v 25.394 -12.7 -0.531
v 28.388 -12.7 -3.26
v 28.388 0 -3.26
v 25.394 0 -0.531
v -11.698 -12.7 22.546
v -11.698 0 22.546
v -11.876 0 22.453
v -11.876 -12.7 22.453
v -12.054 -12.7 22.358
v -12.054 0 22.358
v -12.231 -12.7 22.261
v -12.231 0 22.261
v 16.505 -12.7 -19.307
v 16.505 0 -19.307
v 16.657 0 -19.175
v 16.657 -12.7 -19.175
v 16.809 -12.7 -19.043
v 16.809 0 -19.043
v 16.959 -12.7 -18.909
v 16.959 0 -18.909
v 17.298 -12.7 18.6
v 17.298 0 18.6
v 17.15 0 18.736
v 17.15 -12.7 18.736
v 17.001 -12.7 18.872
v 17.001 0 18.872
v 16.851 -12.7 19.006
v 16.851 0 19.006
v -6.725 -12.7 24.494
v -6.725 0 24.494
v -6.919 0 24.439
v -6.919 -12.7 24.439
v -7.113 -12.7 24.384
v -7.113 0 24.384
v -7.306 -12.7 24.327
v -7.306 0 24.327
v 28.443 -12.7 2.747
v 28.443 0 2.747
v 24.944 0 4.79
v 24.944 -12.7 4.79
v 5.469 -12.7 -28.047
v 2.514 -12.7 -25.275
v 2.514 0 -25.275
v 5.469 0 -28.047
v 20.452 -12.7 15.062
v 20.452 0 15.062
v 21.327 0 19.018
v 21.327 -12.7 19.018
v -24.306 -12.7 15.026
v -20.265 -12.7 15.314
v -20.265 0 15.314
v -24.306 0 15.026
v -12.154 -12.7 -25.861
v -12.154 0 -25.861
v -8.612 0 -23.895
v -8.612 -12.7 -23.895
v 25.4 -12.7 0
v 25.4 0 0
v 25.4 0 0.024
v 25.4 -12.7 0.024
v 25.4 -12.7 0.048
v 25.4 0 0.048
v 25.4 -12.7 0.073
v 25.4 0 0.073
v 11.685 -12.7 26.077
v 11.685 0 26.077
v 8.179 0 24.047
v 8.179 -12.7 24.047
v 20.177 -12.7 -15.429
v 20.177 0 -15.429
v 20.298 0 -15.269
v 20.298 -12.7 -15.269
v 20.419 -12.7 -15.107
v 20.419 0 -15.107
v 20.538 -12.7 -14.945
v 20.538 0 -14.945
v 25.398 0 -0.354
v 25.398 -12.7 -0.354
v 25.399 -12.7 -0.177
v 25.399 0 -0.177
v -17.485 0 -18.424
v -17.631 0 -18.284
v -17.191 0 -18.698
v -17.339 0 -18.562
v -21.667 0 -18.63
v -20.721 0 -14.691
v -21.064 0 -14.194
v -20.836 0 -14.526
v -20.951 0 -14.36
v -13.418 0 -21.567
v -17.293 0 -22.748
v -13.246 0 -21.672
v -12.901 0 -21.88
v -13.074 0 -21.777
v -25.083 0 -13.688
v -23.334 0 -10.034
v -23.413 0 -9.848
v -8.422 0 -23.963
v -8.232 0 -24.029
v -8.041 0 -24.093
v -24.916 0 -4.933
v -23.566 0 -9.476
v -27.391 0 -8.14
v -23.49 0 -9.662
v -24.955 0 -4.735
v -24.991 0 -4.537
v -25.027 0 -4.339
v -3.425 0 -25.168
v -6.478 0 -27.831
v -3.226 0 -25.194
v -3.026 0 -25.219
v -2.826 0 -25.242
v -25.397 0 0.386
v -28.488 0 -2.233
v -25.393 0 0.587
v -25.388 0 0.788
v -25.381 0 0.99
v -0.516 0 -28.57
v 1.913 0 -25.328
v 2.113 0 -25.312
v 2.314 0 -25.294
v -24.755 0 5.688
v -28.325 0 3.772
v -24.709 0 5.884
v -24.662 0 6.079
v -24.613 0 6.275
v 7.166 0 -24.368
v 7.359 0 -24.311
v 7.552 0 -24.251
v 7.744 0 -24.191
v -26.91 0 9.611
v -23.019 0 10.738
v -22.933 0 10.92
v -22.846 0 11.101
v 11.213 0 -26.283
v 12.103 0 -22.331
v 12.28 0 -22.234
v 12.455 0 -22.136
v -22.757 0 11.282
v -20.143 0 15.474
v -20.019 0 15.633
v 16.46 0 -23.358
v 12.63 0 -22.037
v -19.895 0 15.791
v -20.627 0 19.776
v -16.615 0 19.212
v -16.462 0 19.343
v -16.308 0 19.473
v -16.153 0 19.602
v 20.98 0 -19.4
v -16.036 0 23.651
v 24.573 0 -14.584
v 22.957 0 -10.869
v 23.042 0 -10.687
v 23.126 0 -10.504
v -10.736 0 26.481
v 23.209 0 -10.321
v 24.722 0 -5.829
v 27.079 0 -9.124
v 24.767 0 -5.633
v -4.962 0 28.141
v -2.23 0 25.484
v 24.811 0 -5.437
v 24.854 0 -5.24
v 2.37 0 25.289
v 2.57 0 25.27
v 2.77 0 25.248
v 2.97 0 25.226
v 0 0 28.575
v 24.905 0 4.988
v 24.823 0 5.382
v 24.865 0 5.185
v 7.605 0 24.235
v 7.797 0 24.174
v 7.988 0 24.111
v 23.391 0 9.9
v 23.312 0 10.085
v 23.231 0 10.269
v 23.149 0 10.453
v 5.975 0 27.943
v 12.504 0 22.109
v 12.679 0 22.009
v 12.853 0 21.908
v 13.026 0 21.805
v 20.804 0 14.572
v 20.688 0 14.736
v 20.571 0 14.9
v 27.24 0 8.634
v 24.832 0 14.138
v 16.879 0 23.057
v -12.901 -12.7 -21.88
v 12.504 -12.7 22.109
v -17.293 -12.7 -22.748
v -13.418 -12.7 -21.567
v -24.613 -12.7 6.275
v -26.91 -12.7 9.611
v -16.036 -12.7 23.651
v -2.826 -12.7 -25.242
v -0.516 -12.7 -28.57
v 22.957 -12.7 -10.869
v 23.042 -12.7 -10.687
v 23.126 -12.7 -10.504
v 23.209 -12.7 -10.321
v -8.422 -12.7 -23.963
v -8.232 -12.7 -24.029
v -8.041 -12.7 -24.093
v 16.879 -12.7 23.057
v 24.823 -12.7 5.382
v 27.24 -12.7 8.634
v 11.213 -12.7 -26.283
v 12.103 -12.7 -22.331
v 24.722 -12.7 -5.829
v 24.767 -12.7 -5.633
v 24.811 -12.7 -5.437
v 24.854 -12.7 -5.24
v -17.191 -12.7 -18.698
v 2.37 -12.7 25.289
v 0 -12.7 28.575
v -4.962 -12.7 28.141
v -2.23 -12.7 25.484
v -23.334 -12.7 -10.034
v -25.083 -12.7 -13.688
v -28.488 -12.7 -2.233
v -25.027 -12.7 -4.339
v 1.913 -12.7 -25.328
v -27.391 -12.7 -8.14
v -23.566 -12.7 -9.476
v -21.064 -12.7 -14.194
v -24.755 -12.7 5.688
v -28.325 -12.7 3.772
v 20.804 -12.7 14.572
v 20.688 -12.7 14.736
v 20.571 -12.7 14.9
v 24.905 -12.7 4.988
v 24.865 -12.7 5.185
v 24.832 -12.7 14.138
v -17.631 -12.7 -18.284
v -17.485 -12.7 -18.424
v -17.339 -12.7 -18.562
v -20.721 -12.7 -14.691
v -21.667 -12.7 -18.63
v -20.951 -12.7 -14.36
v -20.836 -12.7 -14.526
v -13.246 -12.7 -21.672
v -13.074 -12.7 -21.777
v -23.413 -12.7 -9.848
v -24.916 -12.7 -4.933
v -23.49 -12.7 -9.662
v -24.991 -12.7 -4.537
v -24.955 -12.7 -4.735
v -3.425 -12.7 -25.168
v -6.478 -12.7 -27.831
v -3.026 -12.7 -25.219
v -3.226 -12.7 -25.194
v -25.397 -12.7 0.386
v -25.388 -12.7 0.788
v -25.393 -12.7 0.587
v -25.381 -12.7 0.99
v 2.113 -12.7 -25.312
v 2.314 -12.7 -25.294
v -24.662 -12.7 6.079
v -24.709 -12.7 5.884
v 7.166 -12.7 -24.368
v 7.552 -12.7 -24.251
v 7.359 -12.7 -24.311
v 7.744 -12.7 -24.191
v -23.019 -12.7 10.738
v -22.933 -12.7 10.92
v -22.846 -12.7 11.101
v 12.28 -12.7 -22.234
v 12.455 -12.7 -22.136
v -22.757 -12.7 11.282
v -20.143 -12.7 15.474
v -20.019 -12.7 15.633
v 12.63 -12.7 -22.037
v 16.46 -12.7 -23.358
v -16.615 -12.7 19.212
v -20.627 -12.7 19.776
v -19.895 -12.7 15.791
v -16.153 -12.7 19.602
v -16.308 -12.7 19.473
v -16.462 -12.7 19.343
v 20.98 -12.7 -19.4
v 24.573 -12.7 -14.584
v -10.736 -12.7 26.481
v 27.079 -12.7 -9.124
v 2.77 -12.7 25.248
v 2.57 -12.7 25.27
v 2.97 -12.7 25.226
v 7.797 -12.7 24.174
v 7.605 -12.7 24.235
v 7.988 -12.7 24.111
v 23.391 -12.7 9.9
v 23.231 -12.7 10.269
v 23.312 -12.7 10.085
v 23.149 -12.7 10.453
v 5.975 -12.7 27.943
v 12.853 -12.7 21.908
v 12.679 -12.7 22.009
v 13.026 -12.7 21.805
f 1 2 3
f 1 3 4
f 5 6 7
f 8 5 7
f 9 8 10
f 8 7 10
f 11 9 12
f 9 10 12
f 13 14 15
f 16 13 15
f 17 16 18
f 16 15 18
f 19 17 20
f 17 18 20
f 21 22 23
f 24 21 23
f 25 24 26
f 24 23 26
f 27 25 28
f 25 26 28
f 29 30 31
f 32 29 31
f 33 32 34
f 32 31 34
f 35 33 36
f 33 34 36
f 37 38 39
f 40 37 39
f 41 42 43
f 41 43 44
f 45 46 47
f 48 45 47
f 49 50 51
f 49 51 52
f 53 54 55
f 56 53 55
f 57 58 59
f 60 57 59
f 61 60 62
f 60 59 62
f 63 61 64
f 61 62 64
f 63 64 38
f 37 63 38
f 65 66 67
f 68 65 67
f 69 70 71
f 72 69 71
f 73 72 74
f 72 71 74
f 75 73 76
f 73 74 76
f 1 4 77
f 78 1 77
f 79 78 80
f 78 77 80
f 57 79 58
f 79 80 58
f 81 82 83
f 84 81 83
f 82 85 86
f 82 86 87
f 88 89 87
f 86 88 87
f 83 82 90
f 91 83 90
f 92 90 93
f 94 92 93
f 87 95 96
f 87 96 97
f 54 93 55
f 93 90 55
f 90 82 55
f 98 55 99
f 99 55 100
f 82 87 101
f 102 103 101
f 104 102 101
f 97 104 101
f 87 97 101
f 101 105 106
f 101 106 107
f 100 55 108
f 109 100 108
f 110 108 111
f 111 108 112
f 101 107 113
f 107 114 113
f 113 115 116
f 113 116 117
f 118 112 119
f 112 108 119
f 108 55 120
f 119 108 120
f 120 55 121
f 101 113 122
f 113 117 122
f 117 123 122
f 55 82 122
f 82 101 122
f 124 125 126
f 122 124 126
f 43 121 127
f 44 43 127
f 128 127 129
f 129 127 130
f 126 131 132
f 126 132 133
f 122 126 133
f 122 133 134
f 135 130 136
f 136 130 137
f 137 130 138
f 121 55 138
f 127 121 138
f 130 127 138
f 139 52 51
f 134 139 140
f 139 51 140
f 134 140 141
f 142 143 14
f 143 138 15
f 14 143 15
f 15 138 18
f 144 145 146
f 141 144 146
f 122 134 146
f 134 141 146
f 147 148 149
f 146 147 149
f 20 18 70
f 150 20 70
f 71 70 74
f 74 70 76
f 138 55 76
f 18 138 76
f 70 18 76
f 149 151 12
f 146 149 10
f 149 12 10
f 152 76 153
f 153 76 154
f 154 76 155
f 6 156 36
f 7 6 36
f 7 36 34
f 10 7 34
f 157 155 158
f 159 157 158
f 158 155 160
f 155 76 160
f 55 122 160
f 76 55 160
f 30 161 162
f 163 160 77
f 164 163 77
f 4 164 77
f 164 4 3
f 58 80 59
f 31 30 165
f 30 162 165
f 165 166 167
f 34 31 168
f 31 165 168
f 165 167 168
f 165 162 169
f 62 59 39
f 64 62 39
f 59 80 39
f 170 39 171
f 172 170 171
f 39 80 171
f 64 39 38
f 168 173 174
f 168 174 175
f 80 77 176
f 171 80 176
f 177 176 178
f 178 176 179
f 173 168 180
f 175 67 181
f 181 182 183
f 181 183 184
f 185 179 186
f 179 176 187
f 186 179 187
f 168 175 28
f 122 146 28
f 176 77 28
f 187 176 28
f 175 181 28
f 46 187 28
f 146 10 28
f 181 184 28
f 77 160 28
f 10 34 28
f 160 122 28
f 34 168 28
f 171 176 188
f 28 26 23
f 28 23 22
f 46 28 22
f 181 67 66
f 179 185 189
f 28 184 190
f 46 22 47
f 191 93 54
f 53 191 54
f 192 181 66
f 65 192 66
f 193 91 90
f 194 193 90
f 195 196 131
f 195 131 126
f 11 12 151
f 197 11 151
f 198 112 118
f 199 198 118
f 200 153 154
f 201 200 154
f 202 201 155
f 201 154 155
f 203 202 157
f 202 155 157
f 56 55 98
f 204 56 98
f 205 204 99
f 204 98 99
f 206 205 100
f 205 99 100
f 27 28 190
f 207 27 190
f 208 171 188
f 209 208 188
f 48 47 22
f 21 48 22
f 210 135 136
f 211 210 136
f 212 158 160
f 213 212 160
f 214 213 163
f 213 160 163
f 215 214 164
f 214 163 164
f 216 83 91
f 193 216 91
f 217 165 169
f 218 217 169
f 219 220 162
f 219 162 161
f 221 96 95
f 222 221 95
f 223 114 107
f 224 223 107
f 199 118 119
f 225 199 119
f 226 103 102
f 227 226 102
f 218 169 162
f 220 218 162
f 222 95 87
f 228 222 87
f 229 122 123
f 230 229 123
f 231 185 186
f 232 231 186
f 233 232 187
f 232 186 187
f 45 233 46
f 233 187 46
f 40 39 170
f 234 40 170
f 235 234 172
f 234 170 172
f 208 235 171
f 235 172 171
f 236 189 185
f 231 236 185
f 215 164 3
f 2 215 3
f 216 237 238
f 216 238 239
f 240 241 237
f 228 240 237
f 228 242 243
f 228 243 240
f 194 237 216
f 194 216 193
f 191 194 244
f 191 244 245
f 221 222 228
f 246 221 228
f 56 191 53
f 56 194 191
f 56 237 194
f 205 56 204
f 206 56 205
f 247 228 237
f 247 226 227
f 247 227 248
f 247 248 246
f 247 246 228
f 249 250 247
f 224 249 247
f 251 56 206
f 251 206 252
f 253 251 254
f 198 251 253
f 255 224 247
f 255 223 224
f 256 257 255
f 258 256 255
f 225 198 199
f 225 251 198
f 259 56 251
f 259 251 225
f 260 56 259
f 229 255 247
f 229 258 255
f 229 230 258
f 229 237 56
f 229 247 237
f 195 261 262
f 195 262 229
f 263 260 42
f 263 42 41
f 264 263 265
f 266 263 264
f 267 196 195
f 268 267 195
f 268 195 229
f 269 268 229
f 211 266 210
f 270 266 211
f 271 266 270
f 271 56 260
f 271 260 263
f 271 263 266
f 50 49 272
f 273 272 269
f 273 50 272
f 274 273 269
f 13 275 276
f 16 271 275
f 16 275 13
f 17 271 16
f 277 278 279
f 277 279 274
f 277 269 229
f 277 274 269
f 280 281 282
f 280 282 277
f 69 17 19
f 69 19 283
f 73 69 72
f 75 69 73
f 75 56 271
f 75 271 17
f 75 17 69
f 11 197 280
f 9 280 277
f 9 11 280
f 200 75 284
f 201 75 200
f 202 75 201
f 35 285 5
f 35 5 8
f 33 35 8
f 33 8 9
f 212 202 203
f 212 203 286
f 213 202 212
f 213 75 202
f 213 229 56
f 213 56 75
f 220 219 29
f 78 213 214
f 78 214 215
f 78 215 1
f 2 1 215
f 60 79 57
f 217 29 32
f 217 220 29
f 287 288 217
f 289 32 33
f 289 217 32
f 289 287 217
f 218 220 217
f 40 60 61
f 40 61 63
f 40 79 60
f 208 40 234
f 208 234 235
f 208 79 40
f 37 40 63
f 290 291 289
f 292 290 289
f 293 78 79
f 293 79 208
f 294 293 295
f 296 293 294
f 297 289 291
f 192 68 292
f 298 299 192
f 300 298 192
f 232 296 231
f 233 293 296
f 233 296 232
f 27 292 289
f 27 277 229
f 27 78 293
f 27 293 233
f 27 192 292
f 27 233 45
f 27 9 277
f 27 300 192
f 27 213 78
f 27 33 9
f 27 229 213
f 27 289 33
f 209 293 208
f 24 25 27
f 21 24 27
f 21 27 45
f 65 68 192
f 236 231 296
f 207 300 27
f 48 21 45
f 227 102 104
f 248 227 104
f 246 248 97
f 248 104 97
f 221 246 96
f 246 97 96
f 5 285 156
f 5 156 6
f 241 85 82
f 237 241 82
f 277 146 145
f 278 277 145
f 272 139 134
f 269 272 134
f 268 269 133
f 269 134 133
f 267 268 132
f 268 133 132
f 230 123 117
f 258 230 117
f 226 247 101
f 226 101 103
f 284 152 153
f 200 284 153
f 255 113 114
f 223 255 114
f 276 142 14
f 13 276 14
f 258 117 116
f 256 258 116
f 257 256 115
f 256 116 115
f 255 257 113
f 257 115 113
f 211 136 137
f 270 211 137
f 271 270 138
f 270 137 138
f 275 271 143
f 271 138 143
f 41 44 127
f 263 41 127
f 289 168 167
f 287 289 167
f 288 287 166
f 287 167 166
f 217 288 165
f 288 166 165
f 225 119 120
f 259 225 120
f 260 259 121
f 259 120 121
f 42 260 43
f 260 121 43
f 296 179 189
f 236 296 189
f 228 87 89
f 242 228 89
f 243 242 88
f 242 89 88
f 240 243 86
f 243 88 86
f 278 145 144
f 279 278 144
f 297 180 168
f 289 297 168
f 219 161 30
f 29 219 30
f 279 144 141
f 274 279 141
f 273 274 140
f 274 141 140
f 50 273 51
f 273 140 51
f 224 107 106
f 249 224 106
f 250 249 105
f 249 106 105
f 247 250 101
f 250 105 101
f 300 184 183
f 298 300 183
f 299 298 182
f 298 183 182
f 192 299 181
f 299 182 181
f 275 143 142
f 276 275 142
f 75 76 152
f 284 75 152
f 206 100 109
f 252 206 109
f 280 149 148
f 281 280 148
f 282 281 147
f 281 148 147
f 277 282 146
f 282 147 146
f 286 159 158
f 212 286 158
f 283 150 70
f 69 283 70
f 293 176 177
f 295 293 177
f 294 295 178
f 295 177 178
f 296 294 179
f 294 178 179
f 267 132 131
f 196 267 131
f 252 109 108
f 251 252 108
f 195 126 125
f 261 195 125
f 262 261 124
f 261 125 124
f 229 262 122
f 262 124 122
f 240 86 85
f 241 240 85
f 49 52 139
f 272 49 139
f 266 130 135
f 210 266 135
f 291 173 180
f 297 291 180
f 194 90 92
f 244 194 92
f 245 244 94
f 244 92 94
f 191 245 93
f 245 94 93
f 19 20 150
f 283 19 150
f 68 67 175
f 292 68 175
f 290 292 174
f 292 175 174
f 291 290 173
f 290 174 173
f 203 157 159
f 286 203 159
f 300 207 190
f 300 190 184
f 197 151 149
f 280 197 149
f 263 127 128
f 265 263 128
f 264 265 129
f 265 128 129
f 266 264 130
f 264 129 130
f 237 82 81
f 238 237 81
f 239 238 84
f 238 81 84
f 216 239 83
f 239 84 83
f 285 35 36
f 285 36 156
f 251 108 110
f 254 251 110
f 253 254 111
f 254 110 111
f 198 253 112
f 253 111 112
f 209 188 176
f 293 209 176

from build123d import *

# Parameters (mm, degrees)
F1_DEPTH = 12.7


with BuildPart() as f1:
    # F0 (on Front) → F1 (new body)
    with BuildSketch(Plane.XZ):
        with BuildLine():
            ThreePointArc((25.3944439241, -0.5312417394), (25.398610943, -0.2656353966), (25.4, 0))
            ThreePointArc((25.4, 0), (25.3999740039, 0.0363400731), (25.3998960157, 0.0726800719))
            ThreePointArc((25.3998960157, 0.0726800719), (25.2823297123, 2.4420901537), (24.9442179938, 4.7901971439))
            ThreePointArc((24.9442179938, 4.7901971439), (24.8855058459, 5.0864131562), (24.8232762213, 5.3819102222))
            ThreePointArc((24.8232762213, 5.3819102222), (24.2128911527, 7.6743665555), (23.3912897052, 9.8998770662))
            ThreePointArc((23.3912897052, 9.8998770662), (23.2719398097, 10.1772696484), (23.1493005092, 10.4532237101))
            ThreePointArc((23.1493005092, 10.4532237101), (22.0730798045, 12.5673842921), (20.804308943, 14.5719157767))
            ThreePointArc((20.804308943, 14.5719157767), (20.6295973686, 14.8182223093), (20.4519698749, 15.0624343396))
            ThreePointArc((20.4519698749, 15.0624343396), (18.9574897343, 16.9048390402), (17.2976376722, 18.5997777127))
            ThreePointArc((17.2976376722, 18.5997777127), (17.0752878467, 18.8041097889), (16.8505244908, 19.0057839718))
            ThreePointArc((16.8505244908, 19.0057839718), (15.0038509972, 20.4949861004), (13.0262943696, 21.8054042613))
            ThreePointArc((13.0262943696, 21.8054042613), (12.7661356522, 21.9587290277), (12.5041724875, 22.1089500068))
            ThreePointArc((12.5041724875, 22.1089500068), (10.386941041, 23.1791168039), (8.1791011637, 24.0470851488))
            ThreePointArc((8.1791011637, 24.0470851488), (7.892634321, 24.1426246186), (7.6050518829, 24.2347516154))
            ThreePointArc((7.6050518829, 24.2347516154), (5.3108583666, 24.8385745044), (2.9703366251, 25.2257229893))
            ThreePointArc((2.9703366251, 25.2257229893), (2.6702254201, 25.2592536748), (2.3697367884, 25.2892140557))
            ThreePointArc((2.3697367884, 25.2892140557), (0.1566189899, 25.3995171311), (-2.0576907736, 25.3165145445))
            ThreePointArc((-2.0576907736, 25.3165145445), (-2.2137558658, 25.3033453315), (-2.3697367884, 25.2892140557))
            ThreePointArc((-2.3697367884, 25.2892140557), (-4.564819459, 24.9864447913), (-6.7251610972, 24.4935135948))
            ThreePointArc((-6.7251610972, 24.4935135948), (-7.0158820659, 24.411829076), (-7.3056113649, 24.3266940332))
            ThreePointArc((-7.3056113649, 24.3266940332), (-9.5433476931, 23.5389998685), (-11.6978345106, 22.5459678826))
            ThreePointArc((-11.6978345106, 22.5459678826), (-11.9650502401, 22.4053023356), (-12.2305747529, 22.2614698799))
            ThreePointArc((-12.2305747529, 22.2614698799), (-14.2541514602, 21.0233005532), (-16.1533848895, 19.601738612))
            ThreePointArc((-16.1533848895, 19.601738612), (-16.3852826458, 19.4083104009), (-16.6148644014, 19.212138895))
            ThreePointArc((-16.6148644014, 19.212138895), (-18.3348257747, 17.5782298259), (-19.8948469127, 15.790980537))
            ThreePointArc((-19.8948469127, 15.790980537), (-20.0811752538, 15.5533404909), (-20.2646651932, 15.3135020361))
            ThreePointArc((-20.2646651932, 15.3135020361), (-21.604977361, 13.3560830047), (-22.7568227715, 11.2821548184))
            ThreePointArc((-22.7568227715, 11.2821548184), (-22.8893447304, 11.010808227), (-23.0186313629, 10.7379052976))
            ThreePointArc((-23.0186313629, 10.7379052976), (-23.9200435047, 8.5435074024), (-24.6127938663, 6.274581906))
            ThreePointArc((-24.6127938663, 6.274581906), (-24.6856510803, 5.9815241155), (-24.7550190663, 5.687620858))
            ThreePointArc((-24.7550190663, 5.687620858), (-25.1776826971, 3.3532512586), (-25.3807137804, 0.9896302333))
            ThreePointArc((-25.3807137804, 0.9896302333), (-25.3906854701, 0.6878163708), (-25.3970682778, 0.3859052878))
            ThreePointArc((-25.3970682778, 0.3859052878), (-25.3222988198, -1.9852411648), (-25.026635284, -4.3390697578))
            ThreePointArc((-25.026635284, -4.3390697578), (-24.9732806336, -4.6362974879), (-24.9163960999, -4.932869894))
            ThreePointArc((-24.9163960999, -4.932869894), (-24.3474988664, -7.2359725641), (-23.5662110303, -9.4759536553))
            ThreePointArc((-23.5662110303, -9.4759536553), (-23.4518886745, -9.7554557863), (-23.3342514788, -10.0335790187))
            ThreePointArc((-23.3342514788, -10.0335790187), (-22.2963755574, -12.166825264), (-21.0640016027, -14.1939366097))
            ThreePointArc((-21.0640016027, -14.1939366097), (-20.8937653594, -14.4433572658), (-20.7205758576, -14.6907364053))
            ThreePointArc((-20.7205758576, -14.6907364053), (-19.2596023508, -16.5598223809), (-17.6306215028, -18.2844520132))
            ThreePointArc((-17.6306215028, -18.2844520132), (-17.4119969598, -18.4927651224), (-17.1909112938, -18.6984643457))
            ThreePointArc((-17.1909112938, -18.6984643457), (-15.3714250659, -20.2207638689), (-13.4178492442, -21.566671548))
            ThreePointArc((-13.4178492442, -21.566671548), (-13.1605010782, -21.7246682684), (-12.9012927227, -21.8795942852))
            ThreePointArc((-12.9012927227, -21.8795942852), (-10.8037273136, -22.987811469), (-8.6119177209, -23.8954990148))
            ThreePointArc((-8.6119177209, -23.8954990148), (-8.3272224532, -23.9961948278), (-8.0413501625, -24.0934988651))
            ThreePointArc((-8.0413501625, -24.0934988651), (-5.7584320841, -24.7386430496), (-3.4252814594, -25.1679845622))
            ThreePointArc((-3.4252814594, -25.1679845622), (-3.1258245374, -25.206928035), (-2.8259257913, -25.2423085993))
            ThreePointArc((-2.8259257913, -25.2423085993), (-0.458575391, -25.3958600683), (1.9127753013, -25.3278757626))
            ThreePointArc((1.9127753013, -25.3278757626), (2.2137558658, -25.3033453315), (2.5144235238, -25.2752383637))
            ThreePointArc((2.5144235238, -25.2752383637), (4.8615534215, -24.9304091088), (7.1662745171, -24.3681043486))
            ThreePointArc((7.1662745171, -24.3681043486), (7.4554733568, -24.2811844239), (7.7436183923, -24.1908324411))
            ThreePointArc((7.7436183923, -24.1908324411), (9.9667688451, -23.3628662366), (12.1029761563, -22.3310986779))
            ThreePointArc((12.1029761563, -22.3310986779), (12.3676087357, -22.1856317052), (12.6304931982, -22.0370288735))
            ThreePointArc((12.6304931982, -22.0370288735), (14.63138599, -20.7625273994), (16.5046447729, -19.306908114))
            ThreePointArc((16.5046447729, -19.306908114), (16.7330125505, -19.1093247129), (16.9590151771, -18.9090402777))
            ThreePointArc((16.9590151771, -18.9090402777), (18.6491973766, -17.2443450791), (20.1766969823, -15.4292222385))
            ThreePointArc((20.1766969823, -15.4292222385), (20.358704565, -15.1882569255), (20.5378345181, -14.9451448071))
            ThreePointArc((20.5378345181, -14.9451448071), (21.842588694, -12.9638466185), (22.9568033568, -10.8694608715))
            ThreePointArc((22.9568033568, -10.8694608715), (23.0844047841, -10.5957659356), (23.208743314, -10.3205733263))
            ThreePointArc((23.208743314, -10.3205733263), (24.070390548, -8.1102588655), (24.7220644791, -5.8291961615))
            ThreePointArc((24.7220644791, -5.8291961615), (24.789618909, -5.5348707613), (24.8536694156, -5.239763027))
            ThreePointArc((24.8536694156, -5.239763027), (25.2341190995, -2.8981430728), (25.3944439241, -0.5312417394))
        make_face()
        with BuildLine():
            ThreePointArc((24.9442179938, 4.7901971439), (25.2823297123, 2.4420901537), (25.3998960157, 0.0726800719))
            Line((25.3998960157, 0.0726800719), (28.4426209263, 2.7473514229))
            Line((28.4426209263, 2.7473514229), (24.9442179938, 4.7901971439))
        make_face()
        with BuildLine():
            Line((28.388383987, -3.2604109569), (25.3944439241, -0.5312417394))
            ThreePointArc((25.3944439241, -0.5312417394), (25.2341190995, -2.8981430728), (24.8536694156, -5.239763027))
            Line((24.8536694156, -5.239763027), (28.388383987, -3.2604109569))
        make_face()
        with BuildLine():
            ThreePointArc((23.3912897052, 9.8998770662), (24.2128911527, 7.6743665555), (24.8232762213, 5.3819102222))
            Line((24.8232762213, 5.3819102222), (27.2395025468, 8.6336623749))
            Line((27.2395025468, 8.6336623749), (23.3912897052, 9.8998770662))
        make_face()
        with BuildLine():
            Line((27.0791893665, -9.1240412236), (24.7220644791, -5.8291961615))
            ThreePointArc((24.7220644791, -5.8291961615), (24.070390548, -8.1102588655), (23.208743314, -10.3205733263))
            Line((23.208743314, -10.3205733263), (27.0791893665, -9.1240412236))
        make_face()
        with BuildLine():
            ThreePointArc((20.804308943, 14.5719157767), (22.0730798045, 12.5673842921), (23.1493005092, 10.4532237101))
            Line((23.1493005092, 10.4532237101), (24.83221478, 14.1383073286))
            Line((24.83221478, 14.1383073286), (20.804308943, 14.5719157767))
        make_face()
        with BuildLine():
            Line((24.5729122807, -14.5843274458), (22.9568033568, -10.8694608715))
            ThreePointArc((22.9568033568, -10.8694608715), (21.842588694, -12.9638466185), (20.5378345181, -14.9451448071))
            Line((20.5378345181, -14.9451448071), (24.5729122807, -14.5843274458))
        make_face()
        with BuildLine():
            ThreePointArc((17.2976376722, 18.5997777127), (18.9574897343, 16.9048390402), (20.4519698749, 15.0624343396))
            Line((20.4519698749, 15.0624343396), (21.3271759511, 19.0179439202))
            Line((21.3271759511, 19.0179439202), (17.2976376722, 18.5997777127))
        make_face()
        with BuildLine():
            Line((20.9803470487, -19.399888214), (20.1766969823, -15.4292222385))
            ThreePointArc((20.1766969823, -15.4292222385), (18.6491973766, -17.2443450791), (16.9590151771, -18.9090402777))
            Line((16.9590151771, -18.9090402777), (20.9803470487, -19.399888214))
        make_face()
        with BuildLine():
            ThreePointArc((13.0262943696, 21.8054042613), (15.0038509972, 20.4949861004), (16.8505244908, 19.0057839718))
            Line((16.8505244908, 19.0057839718), (16.8793323718, 23.0568593629))
            Line((16.8793323718, 23.0568593629), (13.0262943696, 21.8054042613))
        make_face()
        with BuildLine():
            Line((16.4603092388, -23.3578433243), (16.5046447729, -19.306908114))
            ThreePointArc((16.5046447729, -19.306908114), (14.63138599, -20.7625273994), (12.6304931982, -22.0370288735))
            Line((12.6304931982, -22.0370288735), (16.4603092388, -23.3578433243))
        make_face()
        with BuildLine():
            ThreePointArc((8.1791011637, 24.0470851488), (10.386941041, 23.1791168039), (12.5041724875, 22.1089500068))
            Line((12.5041724875, 22.1089500068), (11.6853086711, 26.0765064044))
            Line((11.6853086711, 26.0765064044), (8.1791011637, 24.0470851488))
        make_face()
        with BuildLine():
            Line((11.2126149507, -26.2832245162), (12.1029761563, -22.3310986779))
            ThreePointArc((12.1029761563, -22.3310986779), (9.9667688451, -23.3628662366), (7.7436183923, -24.1908324411))
            Line((7.7436183923, -24.1908324411), (11.2126149507, -26.2832245162))
        make_face()
        with BuildLine():
            ThreePointArc((2.9703366251, 25.2257229893), (5.3108583666, 24.8385745044), (7.6050518829, 24.2347516154))
            Line((7.6050518829, 24.2347516154), (5.9747156624, 27.9433963174))
            Line((5.9747156624, 27.9433963174), (2.9703366251, 25.2257229893))
        make_face()
        with BuildLine():
            Line((5.4692475992, -28.0467102473), (7.1662745171, -24.3681043486))
            ThreePointArc((7.1662745171, -24.3681043486), (4.8615534215, -24.9304091088), (2.5144235238, -25.2752383637))
            Line((2.5144235238, -25.2752383637), (5.4692475992, -28.0467102473))
        make_face()
        with BuildLine():
            ThreePointArc((-2.0576907736, 25.3165145445), (0.1566189899, 25.3995171311), (2.3697367884, 25.2892140557))
            Line((2.3697367884, 25.2892140557), (0, 28.575))
            Line((0, 28.575), (-2.2295280407, 25.4836221159))
            Line((-2.2295280407, 25.4836221159), (-2.0576907736, 25.3165145445))
        make_face()
        with BuildLine():
            Line((-0.5158973148, -28.5703425769), (1.9127753013, -25.3278757626))
            ThreePointArc((1.9127753013, -25.3278757626), (-0.458575391, -25.3958600683), (-2.8259257913, -25.2423085993))
            Line((-2.8259257913, -25.2423085993), (-0.5158973148, -28.5703425769))
        make_face()
        with BuildLine():
            ThreePointArc((-2.3697367884, 25.2892140557), (-2.2137558658, 25.3033453315), (-2.0576907736, 25.3165145445))
            Line((-2.0576907736, 25.3165145445), (-2.2295280407, 25.4836221159))
            Line((-2.2295280407, 25.4836221159), (-2.3697367884, 25.2892140557))
        make_face()
        with BuildLine():
            ThreePointArc((-6.7251610972, 24.4935135948), (-4.564819459, 24.9864447913), (-2.3697367884, 25.2892140557))
            Line((-2.3697367884, 25.2892140557), (-2.2295280407, 25.4836221159))
            Line((-2.2295280407, 25.4836221159), (-4.9619966768, 28.1408815423))
            Line((-4.9619966768, 28.1408815423), (-6.7251610972, 24.4935135948))
        make_face()
        with BuildLine():
            Line((-6.4782360946, -27.8309734307), (-3.4252814594, -25.1679845622))
            ThreePointArc((-3.4252814594, -25.1679845622), (-5.7584320841, -24.7386430496), (-8.0413501625, -24.0934988651))
            Line((-8.0413501625, -24.0934988651), (-6.4782360946, -27.8309734307))
        make_face()
        with BuildLine():
            ThreePointArc((-11.6978345106, 22.5459678826), (-9.5433476931, 23.5389998685), (-7.3056113649, 24.3266940332))
            Line((-7.3056113649, 24.3266940332), (-10.7362661547, 26.481374852))
            Line((-10.7362661547, 26.481374852), (-11.6978345106, 22.5459678826))
        make_face()
        with BuildLine():
            Line((-12.1541932278, -25.8612879026), (-8.6119177209, -23.8954990148))
            ThreePointArc((-8.6119177209, -23.8954990148), (-10.8037273136, -22.987811469), (-12.9012927227, -21.8795942852))
            Line((-12.9012927227, -21.8795942852), (-12.1541932278, -25.8612879026))
        make_face()
        with BuildLine():
            ThreePointArc((-16.1533848895, 19.601738612), (-14.2541514602, 21.0233005532), (-12.2305747529, 22.2614698799))
            Line((-12.2305747529, 22.2614698799), (-16.0359203927, 23.6512131223))
            Line((-16.0359203927, 23.6512131223), (-16.1533848895, 19.601738612))
        make_face()
        with BuildLine():
            Line((-17.2928531992, -22.7483593525), (-13.4178492442, -21.566671548))
            ThreePointArc((-13.4178492442, -21.566671548), (-15.3714250659, -20.2207638689), (-17.1909112938, -18.6984643457))
            Line((-17.1909112938, -18.6984643457), (-17.2928531992, -22.7483593525))
        make_face()
        with BuildLine():
            ThreePointArc((-19.8948469127, 15.790980537), (-18.3348257747, 17.5782298259), (-16.6148644014, 19.212138895))
            Line((-16.6148644014, 19.212138895), (-20.6266789965, 19.7755085541))
            Line((-20.6266789965, 19.7755085541), (-19.8948469127, 15.790980537))
        make_face()
        with BuildLine():
            Line((-21.6670526447, -18.6298001786), (-17.6306215028, -18.2844520132))
            ThreePointArc((-17.6306215028, -18.2844520132), (-19.2596023508, -16.5598223809), (-20.7205758576, -14.6907364053))
            Line((-20.7205758576, -14.6907364053), (-21.6670526447, -18.6298001786))
        make_face()
        with BuildLine():
            ThreePointArc((-22.7568227715, 11.2821548184), (-21.604977361, 13.3560830047), (-20.2646651932, 15.3135020361))
            Line((-20.2646651932, 15.3135020361), (-24.3055995312, 15.0255933803))
            Line((-24.3055995312, 15.0255933803), (-22.7568227715, 11.2821548184))
        make_face()
        with BuildLine():
            Line((-25.083422502, -13.687678422), (-21.0640016027, -14.1939366097))
            ThreePointArc((-21.0640016027, -14.1939366097), (-22.2963755574, -12.166825264), (-23.3342514788, -10.0335790187))
            Line((-23.3342514788, -10.0335790187), (-25.083422502, -13.687678422))
        make_face()
        with BuildLine():
            ThreePointArc((-24.6127938663, 6.274581906), (-23.9200435047, 8.5435074024), (-23.0186313629, 10.7379052976))
            Line((-23.0186313629, 10.7379052976), (-26.9100489427, 9.6114458277))
            Line((-26.9100489427, 9.6114458277), (-24.6127938663, 6.274581906))
        make_face()
        with BuildLine():
            Line((-27.3909362247, -8.1404691347), (-23.5662110303, -9.4759536553))
            ThreePointArc((-23.5662110303, -9.4759536553), (-24.3474988664, -7.2359725641), (-24.9163960999, -4.932869894))
            Line((-24.9163960999, -4.932869894), (-27.3909362247, -8.1404691347))
        make_face()
        with BuildLine():
            ThreePointArc((-25.3807137804, 0.9896302333), (-25.1776826971, 3.3532512586), (-24.7550190663, 5.687620858))
            Line((-24.7550190663, 5.687620858), (-28.3248930343, 3.7724076659))
            Line((-28.3248930343, 3.7724076659), (-25.3807137804, 0.9896302333))
        make_face()
        with BuildLine():
            Line((-28.4875861722, -2.2333963104), (-25.026635284, -4.3390697578))
            ThreePointArc((-25.026635284, -4.3390697578), (-25.3222988198, -1.9852411648), (-25.3970682778, 0.3859052878))
            Line((-25.3970682778, 0.3859052878), (-28.4875861722, -2.2333963104))
        make_face()
    extrude(amount=F1_DEPTH)


solid = f1.part
